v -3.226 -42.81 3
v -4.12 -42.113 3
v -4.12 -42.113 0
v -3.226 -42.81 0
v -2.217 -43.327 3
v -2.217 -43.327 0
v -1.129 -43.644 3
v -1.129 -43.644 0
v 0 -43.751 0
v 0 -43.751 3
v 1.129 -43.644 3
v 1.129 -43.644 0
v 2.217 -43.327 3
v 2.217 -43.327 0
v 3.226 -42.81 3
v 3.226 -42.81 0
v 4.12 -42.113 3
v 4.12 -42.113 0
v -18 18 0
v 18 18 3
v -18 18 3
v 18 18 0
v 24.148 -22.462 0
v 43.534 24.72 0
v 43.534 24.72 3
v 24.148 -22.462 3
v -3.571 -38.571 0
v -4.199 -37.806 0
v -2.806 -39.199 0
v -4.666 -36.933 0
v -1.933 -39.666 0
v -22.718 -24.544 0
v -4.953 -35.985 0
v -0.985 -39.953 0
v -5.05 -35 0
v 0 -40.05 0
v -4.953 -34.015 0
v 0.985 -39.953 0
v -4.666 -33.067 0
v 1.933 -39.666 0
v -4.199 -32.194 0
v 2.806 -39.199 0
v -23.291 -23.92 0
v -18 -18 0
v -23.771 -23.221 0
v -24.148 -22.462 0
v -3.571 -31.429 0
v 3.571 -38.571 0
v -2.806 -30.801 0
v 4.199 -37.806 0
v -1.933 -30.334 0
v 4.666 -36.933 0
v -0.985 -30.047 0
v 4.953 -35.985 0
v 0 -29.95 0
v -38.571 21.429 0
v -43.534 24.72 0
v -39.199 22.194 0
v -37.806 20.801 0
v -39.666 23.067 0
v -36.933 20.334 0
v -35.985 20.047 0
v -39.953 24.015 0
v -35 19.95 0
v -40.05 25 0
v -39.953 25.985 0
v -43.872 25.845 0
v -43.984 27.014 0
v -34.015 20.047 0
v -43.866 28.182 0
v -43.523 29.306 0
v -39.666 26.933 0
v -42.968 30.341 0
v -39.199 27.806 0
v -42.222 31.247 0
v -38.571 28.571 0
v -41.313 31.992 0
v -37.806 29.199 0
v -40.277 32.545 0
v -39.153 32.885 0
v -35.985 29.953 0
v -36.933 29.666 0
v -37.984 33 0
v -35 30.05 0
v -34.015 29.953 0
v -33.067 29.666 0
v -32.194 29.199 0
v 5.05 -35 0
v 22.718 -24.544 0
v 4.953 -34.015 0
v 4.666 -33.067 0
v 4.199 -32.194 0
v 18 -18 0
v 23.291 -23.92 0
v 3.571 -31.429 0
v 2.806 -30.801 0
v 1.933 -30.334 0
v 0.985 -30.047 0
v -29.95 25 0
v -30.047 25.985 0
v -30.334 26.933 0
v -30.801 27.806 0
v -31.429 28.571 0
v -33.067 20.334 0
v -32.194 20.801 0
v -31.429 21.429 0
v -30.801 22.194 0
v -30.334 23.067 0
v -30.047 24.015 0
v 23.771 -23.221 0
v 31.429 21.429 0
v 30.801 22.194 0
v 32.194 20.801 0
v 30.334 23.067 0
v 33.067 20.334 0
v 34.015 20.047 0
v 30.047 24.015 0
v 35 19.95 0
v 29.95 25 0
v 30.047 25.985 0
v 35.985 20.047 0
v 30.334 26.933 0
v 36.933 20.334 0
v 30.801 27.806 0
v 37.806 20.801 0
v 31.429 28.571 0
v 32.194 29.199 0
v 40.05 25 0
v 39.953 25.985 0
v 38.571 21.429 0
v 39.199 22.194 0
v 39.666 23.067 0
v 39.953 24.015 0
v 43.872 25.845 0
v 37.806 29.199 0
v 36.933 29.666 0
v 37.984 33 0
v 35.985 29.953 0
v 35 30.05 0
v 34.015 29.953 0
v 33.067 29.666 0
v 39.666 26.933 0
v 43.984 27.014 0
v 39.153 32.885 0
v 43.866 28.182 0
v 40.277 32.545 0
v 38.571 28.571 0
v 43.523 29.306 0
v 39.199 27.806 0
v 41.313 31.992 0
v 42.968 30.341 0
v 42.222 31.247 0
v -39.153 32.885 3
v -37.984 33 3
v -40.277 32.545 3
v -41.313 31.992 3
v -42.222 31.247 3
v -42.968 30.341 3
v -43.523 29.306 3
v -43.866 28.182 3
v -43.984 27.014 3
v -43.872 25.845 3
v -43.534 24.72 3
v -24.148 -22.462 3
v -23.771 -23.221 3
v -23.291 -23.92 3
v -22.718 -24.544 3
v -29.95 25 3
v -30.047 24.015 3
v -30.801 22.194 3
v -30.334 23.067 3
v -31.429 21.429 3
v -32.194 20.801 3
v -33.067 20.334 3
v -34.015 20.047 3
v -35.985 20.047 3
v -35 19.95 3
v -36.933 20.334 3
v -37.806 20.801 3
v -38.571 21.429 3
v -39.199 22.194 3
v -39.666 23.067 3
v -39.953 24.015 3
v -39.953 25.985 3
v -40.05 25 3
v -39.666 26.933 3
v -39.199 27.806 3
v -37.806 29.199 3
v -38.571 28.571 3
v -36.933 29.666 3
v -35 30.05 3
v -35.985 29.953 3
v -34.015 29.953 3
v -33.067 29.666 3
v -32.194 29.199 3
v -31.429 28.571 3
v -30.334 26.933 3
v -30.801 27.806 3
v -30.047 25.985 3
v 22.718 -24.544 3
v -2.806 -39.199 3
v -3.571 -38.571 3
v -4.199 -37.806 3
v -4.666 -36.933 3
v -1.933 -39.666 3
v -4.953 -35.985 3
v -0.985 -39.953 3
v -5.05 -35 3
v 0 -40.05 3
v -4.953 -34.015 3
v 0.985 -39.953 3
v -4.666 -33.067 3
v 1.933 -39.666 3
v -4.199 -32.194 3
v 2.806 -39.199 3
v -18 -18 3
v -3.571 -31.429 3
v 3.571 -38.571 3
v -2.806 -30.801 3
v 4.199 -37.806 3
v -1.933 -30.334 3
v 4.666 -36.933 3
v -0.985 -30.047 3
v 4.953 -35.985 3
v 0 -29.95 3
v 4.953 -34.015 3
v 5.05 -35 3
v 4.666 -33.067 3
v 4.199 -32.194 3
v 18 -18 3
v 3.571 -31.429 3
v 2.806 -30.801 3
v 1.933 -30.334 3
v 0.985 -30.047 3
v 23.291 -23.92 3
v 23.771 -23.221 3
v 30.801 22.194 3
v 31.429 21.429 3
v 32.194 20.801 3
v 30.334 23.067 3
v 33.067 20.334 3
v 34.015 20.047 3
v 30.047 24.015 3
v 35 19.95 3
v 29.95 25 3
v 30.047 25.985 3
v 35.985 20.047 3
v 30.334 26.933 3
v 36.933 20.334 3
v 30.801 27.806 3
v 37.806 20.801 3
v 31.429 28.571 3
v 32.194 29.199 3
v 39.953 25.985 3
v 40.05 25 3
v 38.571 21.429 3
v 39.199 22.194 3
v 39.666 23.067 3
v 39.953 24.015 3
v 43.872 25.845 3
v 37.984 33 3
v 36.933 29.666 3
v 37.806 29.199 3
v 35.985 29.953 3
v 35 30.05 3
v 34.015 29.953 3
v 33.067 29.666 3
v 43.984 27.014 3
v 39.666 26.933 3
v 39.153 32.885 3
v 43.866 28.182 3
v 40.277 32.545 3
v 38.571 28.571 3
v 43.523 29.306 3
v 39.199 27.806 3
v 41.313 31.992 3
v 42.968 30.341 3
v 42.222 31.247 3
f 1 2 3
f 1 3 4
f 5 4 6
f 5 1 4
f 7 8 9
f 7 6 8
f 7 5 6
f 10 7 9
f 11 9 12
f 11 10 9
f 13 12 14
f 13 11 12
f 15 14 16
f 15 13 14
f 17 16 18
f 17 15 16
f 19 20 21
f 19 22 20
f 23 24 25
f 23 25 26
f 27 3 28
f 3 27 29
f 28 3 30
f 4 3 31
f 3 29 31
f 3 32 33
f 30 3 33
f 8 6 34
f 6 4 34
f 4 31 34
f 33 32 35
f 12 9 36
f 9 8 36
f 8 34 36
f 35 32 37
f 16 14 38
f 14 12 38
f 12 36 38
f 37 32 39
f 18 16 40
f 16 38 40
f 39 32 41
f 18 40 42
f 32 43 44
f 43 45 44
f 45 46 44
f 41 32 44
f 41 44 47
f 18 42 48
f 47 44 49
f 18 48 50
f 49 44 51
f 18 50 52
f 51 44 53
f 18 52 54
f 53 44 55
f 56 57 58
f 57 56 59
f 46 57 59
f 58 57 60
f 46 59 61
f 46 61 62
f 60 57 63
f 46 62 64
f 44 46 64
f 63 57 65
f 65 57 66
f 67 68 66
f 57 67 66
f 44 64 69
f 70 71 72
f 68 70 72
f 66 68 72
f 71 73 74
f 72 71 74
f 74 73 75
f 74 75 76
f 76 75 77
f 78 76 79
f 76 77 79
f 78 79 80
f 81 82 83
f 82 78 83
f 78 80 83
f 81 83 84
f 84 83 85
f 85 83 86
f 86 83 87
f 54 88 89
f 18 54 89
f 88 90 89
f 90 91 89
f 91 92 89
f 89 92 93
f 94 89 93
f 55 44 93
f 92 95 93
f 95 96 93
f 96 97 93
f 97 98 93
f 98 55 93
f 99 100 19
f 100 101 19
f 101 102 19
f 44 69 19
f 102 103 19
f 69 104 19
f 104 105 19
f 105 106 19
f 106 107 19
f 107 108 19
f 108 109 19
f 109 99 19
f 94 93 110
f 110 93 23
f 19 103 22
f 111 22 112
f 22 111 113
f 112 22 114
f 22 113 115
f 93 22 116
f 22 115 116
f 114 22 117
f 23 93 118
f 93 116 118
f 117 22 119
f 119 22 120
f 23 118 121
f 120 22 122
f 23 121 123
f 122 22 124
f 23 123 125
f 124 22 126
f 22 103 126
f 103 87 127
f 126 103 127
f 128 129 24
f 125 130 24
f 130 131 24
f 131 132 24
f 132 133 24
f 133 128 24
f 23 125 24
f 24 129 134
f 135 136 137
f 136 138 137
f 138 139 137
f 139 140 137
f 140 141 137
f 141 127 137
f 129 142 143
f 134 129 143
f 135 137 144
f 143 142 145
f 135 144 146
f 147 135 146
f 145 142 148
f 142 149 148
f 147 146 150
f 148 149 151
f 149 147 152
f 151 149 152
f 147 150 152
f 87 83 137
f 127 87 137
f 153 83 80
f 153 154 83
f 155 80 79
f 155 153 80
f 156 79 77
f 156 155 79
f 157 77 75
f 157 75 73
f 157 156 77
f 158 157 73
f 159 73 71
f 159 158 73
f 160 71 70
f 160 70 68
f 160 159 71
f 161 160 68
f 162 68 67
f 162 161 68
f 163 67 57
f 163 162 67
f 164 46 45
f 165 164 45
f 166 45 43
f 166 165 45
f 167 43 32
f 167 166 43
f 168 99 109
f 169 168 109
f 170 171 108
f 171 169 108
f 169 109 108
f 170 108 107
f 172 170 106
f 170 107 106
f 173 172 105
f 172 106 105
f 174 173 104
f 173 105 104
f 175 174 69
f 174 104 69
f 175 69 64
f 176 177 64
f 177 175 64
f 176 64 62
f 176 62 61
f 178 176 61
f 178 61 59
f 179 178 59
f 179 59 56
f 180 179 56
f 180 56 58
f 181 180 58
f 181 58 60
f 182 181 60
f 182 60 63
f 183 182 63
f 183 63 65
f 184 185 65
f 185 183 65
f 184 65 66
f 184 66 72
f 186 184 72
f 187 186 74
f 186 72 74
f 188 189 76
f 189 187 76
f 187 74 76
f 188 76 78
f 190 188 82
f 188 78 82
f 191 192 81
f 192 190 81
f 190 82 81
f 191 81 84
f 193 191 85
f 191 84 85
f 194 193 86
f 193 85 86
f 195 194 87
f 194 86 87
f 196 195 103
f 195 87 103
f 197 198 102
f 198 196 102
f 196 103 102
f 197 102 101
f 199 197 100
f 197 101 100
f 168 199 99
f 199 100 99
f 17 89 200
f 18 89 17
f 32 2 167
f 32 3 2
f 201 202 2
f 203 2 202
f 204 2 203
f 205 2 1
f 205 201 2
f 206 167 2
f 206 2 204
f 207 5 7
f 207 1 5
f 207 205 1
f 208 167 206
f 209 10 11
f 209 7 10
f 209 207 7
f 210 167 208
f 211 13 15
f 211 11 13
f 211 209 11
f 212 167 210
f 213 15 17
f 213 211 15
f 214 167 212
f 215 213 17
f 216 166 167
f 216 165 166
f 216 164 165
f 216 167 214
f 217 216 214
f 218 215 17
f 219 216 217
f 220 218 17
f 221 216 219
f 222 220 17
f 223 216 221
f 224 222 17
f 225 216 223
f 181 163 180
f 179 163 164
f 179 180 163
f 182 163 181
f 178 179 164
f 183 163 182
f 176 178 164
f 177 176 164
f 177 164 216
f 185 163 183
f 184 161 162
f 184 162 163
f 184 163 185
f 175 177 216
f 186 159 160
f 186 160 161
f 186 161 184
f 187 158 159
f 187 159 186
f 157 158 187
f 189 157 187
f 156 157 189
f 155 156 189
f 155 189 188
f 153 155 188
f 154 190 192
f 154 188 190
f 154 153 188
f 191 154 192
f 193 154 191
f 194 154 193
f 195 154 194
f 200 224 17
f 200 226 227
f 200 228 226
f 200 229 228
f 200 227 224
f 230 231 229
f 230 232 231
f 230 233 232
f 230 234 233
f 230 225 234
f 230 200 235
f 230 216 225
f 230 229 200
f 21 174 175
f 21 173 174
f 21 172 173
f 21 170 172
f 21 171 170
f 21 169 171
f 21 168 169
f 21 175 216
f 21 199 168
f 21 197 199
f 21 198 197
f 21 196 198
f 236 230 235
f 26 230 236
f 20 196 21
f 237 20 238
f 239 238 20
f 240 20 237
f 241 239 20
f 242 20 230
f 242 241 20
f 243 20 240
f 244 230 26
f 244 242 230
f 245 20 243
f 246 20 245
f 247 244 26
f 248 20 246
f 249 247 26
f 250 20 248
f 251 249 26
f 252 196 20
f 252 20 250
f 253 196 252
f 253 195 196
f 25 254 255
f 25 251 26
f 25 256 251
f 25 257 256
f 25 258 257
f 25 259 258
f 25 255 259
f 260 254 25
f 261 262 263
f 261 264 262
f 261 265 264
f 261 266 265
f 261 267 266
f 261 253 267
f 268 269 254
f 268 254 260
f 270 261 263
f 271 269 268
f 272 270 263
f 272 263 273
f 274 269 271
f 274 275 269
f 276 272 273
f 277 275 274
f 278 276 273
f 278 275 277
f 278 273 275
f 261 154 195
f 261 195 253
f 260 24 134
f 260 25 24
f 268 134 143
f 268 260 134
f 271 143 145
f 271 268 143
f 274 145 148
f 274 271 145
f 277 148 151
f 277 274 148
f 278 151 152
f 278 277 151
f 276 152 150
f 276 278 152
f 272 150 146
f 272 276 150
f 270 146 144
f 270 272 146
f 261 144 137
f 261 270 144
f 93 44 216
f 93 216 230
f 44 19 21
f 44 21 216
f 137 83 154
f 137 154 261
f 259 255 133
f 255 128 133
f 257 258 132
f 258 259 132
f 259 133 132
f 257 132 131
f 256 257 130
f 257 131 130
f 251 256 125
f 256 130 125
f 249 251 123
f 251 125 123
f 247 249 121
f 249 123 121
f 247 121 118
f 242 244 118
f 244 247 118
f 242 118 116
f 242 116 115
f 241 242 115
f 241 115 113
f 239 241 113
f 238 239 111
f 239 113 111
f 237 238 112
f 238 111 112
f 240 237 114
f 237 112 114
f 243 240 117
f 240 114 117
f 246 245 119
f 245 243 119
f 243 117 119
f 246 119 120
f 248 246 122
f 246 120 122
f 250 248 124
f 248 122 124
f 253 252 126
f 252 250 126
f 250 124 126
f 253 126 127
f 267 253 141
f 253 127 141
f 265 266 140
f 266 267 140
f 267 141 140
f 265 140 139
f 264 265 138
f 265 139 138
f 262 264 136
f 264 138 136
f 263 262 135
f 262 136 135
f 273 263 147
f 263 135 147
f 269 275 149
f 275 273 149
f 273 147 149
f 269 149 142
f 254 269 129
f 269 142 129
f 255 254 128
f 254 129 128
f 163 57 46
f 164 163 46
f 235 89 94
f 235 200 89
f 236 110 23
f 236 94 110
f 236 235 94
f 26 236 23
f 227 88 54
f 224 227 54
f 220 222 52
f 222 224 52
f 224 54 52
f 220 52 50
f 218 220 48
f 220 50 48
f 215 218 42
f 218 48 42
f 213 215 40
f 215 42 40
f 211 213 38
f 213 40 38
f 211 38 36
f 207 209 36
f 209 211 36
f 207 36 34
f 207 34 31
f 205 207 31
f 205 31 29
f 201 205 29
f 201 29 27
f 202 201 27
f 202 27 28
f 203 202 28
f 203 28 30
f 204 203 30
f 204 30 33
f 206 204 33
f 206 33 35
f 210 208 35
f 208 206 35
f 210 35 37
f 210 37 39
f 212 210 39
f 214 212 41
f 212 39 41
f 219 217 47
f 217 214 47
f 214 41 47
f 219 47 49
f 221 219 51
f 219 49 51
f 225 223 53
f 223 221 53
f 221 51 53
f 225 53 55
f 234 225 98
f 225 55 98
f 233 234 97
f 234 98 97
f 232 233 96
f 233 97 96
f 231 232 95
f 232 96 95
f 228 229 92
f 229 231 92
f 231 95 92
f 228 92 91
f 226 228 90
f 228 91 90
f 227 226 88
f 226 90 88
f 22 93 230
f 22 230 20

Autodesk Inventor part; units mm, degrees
ref_plane "YZ Plane" through (0, 0, 0) normal (1, 0, 0) x (0, 1, 0)
ref_plane "XZ Plane" through (0, 0, 0) normal (0, 1, 0) x (-1, 0, 0)
ref_plane "XY Plane" through (0, 0, 0) normal (0, 0, 1) x (1, 0, 0)
sketch "Sketch6" plane through (0, 0, 0) normal (0, 0, 1) x (1, 0, 0)
  line L0 (18, 18) -> (-18, 18)
  line L1 (-18, 18) -> (-18, -18)
  line L2 (-18, -18) -> (18, -18)
  line L3 (18, -18) -> (18, 18)
  line L4 (18, 18) -> (-18, -18) construction
  circle A0 centre (0, -35) radius 5.05
  circle A1 centre (35, 25) radius 5.05
  circle A2 centre (-35, 25) radius 5.05
  line L5 (35, 25) -> (-35, 25) construction
  line L6 (-35, 25) -> (0, -35) construction
  line L7 (0, -35) -> (35, 25) construction
  line L8 (0, 18) -> (0, -18) construction
  line L9 (-46.936, 33) -> (46.936, 33)
  line L10 (-18, 18) -> (23.6569, -23.6569) construction
  line L11 (18, 18) -> (-23.6569, -23.6569) construction
  line L12 (46.936, 33) -> (23.6569, -23.6569)
  line L13 (23.6569, -23.6569) -> (0, -46.0053)
  line L14 (0, -46.0053) -> (-23.6569, -23.6569)
  line L15 (-46.936, 33) -> (-23.6569, -23.6569)
  line L16 (-35, 25) -> (-42.3997, 21.9596) construction
  line L17 (0, -35) -> (-5.4937, -40.8154) construction
  point P0 (0, 0)
  point P1 (0, 0)
  point P2 (60, 0)
  point P3 (0, 33)
  point P4 (0, 0)
  dimension "d30" = 36
  dimension "d31" = 36
  dimension "d33" = 10.1
  dimension "d37" = 69.4622
  dimension "d52" = 70
  dimension "d53" = 8
  dimension "d54" = 25
  dimension "d57" = 8
  dimension "d59" = 8
  dimension "d60" = 93.872
  dimension "d61" = 60
  dimension "d62" = 8
  dimension "d63" = 8
extrude "Plate3" add sketch "Sketch6" along normal blind 3
fillet "Corner Round2" radius 6 5 edges at (-46.936, 33, 1.5) (46.936, 33, 1.5) (0, -46.0053, 1.5) (-23.6569, -23.6569, 1.5) (23.6569, -23.6569, 1.5)
equation "\"d41\" = Thickness"
equation "\"BendReliefWidth\" = Thickness"
equation "\"BendReliefDepth\" = 0.5 * Thickness"
equation "\"CornerReliefSize\" = 4 * Thickness"
equation "\"MinimumRemnant\" = 2 * Thickness"
equation "\"TransitionRadius\" = BendRadius"
equation "\"JacobiRadiusSize\" = BendRadius"
equation "\"GapSize\" = Thickness"
equation "\"Thickness\" = 3"
equation "\"BendRadius\" = 5"
properties part number "DS-B-501 beam flange" material "Stainless Steel"
